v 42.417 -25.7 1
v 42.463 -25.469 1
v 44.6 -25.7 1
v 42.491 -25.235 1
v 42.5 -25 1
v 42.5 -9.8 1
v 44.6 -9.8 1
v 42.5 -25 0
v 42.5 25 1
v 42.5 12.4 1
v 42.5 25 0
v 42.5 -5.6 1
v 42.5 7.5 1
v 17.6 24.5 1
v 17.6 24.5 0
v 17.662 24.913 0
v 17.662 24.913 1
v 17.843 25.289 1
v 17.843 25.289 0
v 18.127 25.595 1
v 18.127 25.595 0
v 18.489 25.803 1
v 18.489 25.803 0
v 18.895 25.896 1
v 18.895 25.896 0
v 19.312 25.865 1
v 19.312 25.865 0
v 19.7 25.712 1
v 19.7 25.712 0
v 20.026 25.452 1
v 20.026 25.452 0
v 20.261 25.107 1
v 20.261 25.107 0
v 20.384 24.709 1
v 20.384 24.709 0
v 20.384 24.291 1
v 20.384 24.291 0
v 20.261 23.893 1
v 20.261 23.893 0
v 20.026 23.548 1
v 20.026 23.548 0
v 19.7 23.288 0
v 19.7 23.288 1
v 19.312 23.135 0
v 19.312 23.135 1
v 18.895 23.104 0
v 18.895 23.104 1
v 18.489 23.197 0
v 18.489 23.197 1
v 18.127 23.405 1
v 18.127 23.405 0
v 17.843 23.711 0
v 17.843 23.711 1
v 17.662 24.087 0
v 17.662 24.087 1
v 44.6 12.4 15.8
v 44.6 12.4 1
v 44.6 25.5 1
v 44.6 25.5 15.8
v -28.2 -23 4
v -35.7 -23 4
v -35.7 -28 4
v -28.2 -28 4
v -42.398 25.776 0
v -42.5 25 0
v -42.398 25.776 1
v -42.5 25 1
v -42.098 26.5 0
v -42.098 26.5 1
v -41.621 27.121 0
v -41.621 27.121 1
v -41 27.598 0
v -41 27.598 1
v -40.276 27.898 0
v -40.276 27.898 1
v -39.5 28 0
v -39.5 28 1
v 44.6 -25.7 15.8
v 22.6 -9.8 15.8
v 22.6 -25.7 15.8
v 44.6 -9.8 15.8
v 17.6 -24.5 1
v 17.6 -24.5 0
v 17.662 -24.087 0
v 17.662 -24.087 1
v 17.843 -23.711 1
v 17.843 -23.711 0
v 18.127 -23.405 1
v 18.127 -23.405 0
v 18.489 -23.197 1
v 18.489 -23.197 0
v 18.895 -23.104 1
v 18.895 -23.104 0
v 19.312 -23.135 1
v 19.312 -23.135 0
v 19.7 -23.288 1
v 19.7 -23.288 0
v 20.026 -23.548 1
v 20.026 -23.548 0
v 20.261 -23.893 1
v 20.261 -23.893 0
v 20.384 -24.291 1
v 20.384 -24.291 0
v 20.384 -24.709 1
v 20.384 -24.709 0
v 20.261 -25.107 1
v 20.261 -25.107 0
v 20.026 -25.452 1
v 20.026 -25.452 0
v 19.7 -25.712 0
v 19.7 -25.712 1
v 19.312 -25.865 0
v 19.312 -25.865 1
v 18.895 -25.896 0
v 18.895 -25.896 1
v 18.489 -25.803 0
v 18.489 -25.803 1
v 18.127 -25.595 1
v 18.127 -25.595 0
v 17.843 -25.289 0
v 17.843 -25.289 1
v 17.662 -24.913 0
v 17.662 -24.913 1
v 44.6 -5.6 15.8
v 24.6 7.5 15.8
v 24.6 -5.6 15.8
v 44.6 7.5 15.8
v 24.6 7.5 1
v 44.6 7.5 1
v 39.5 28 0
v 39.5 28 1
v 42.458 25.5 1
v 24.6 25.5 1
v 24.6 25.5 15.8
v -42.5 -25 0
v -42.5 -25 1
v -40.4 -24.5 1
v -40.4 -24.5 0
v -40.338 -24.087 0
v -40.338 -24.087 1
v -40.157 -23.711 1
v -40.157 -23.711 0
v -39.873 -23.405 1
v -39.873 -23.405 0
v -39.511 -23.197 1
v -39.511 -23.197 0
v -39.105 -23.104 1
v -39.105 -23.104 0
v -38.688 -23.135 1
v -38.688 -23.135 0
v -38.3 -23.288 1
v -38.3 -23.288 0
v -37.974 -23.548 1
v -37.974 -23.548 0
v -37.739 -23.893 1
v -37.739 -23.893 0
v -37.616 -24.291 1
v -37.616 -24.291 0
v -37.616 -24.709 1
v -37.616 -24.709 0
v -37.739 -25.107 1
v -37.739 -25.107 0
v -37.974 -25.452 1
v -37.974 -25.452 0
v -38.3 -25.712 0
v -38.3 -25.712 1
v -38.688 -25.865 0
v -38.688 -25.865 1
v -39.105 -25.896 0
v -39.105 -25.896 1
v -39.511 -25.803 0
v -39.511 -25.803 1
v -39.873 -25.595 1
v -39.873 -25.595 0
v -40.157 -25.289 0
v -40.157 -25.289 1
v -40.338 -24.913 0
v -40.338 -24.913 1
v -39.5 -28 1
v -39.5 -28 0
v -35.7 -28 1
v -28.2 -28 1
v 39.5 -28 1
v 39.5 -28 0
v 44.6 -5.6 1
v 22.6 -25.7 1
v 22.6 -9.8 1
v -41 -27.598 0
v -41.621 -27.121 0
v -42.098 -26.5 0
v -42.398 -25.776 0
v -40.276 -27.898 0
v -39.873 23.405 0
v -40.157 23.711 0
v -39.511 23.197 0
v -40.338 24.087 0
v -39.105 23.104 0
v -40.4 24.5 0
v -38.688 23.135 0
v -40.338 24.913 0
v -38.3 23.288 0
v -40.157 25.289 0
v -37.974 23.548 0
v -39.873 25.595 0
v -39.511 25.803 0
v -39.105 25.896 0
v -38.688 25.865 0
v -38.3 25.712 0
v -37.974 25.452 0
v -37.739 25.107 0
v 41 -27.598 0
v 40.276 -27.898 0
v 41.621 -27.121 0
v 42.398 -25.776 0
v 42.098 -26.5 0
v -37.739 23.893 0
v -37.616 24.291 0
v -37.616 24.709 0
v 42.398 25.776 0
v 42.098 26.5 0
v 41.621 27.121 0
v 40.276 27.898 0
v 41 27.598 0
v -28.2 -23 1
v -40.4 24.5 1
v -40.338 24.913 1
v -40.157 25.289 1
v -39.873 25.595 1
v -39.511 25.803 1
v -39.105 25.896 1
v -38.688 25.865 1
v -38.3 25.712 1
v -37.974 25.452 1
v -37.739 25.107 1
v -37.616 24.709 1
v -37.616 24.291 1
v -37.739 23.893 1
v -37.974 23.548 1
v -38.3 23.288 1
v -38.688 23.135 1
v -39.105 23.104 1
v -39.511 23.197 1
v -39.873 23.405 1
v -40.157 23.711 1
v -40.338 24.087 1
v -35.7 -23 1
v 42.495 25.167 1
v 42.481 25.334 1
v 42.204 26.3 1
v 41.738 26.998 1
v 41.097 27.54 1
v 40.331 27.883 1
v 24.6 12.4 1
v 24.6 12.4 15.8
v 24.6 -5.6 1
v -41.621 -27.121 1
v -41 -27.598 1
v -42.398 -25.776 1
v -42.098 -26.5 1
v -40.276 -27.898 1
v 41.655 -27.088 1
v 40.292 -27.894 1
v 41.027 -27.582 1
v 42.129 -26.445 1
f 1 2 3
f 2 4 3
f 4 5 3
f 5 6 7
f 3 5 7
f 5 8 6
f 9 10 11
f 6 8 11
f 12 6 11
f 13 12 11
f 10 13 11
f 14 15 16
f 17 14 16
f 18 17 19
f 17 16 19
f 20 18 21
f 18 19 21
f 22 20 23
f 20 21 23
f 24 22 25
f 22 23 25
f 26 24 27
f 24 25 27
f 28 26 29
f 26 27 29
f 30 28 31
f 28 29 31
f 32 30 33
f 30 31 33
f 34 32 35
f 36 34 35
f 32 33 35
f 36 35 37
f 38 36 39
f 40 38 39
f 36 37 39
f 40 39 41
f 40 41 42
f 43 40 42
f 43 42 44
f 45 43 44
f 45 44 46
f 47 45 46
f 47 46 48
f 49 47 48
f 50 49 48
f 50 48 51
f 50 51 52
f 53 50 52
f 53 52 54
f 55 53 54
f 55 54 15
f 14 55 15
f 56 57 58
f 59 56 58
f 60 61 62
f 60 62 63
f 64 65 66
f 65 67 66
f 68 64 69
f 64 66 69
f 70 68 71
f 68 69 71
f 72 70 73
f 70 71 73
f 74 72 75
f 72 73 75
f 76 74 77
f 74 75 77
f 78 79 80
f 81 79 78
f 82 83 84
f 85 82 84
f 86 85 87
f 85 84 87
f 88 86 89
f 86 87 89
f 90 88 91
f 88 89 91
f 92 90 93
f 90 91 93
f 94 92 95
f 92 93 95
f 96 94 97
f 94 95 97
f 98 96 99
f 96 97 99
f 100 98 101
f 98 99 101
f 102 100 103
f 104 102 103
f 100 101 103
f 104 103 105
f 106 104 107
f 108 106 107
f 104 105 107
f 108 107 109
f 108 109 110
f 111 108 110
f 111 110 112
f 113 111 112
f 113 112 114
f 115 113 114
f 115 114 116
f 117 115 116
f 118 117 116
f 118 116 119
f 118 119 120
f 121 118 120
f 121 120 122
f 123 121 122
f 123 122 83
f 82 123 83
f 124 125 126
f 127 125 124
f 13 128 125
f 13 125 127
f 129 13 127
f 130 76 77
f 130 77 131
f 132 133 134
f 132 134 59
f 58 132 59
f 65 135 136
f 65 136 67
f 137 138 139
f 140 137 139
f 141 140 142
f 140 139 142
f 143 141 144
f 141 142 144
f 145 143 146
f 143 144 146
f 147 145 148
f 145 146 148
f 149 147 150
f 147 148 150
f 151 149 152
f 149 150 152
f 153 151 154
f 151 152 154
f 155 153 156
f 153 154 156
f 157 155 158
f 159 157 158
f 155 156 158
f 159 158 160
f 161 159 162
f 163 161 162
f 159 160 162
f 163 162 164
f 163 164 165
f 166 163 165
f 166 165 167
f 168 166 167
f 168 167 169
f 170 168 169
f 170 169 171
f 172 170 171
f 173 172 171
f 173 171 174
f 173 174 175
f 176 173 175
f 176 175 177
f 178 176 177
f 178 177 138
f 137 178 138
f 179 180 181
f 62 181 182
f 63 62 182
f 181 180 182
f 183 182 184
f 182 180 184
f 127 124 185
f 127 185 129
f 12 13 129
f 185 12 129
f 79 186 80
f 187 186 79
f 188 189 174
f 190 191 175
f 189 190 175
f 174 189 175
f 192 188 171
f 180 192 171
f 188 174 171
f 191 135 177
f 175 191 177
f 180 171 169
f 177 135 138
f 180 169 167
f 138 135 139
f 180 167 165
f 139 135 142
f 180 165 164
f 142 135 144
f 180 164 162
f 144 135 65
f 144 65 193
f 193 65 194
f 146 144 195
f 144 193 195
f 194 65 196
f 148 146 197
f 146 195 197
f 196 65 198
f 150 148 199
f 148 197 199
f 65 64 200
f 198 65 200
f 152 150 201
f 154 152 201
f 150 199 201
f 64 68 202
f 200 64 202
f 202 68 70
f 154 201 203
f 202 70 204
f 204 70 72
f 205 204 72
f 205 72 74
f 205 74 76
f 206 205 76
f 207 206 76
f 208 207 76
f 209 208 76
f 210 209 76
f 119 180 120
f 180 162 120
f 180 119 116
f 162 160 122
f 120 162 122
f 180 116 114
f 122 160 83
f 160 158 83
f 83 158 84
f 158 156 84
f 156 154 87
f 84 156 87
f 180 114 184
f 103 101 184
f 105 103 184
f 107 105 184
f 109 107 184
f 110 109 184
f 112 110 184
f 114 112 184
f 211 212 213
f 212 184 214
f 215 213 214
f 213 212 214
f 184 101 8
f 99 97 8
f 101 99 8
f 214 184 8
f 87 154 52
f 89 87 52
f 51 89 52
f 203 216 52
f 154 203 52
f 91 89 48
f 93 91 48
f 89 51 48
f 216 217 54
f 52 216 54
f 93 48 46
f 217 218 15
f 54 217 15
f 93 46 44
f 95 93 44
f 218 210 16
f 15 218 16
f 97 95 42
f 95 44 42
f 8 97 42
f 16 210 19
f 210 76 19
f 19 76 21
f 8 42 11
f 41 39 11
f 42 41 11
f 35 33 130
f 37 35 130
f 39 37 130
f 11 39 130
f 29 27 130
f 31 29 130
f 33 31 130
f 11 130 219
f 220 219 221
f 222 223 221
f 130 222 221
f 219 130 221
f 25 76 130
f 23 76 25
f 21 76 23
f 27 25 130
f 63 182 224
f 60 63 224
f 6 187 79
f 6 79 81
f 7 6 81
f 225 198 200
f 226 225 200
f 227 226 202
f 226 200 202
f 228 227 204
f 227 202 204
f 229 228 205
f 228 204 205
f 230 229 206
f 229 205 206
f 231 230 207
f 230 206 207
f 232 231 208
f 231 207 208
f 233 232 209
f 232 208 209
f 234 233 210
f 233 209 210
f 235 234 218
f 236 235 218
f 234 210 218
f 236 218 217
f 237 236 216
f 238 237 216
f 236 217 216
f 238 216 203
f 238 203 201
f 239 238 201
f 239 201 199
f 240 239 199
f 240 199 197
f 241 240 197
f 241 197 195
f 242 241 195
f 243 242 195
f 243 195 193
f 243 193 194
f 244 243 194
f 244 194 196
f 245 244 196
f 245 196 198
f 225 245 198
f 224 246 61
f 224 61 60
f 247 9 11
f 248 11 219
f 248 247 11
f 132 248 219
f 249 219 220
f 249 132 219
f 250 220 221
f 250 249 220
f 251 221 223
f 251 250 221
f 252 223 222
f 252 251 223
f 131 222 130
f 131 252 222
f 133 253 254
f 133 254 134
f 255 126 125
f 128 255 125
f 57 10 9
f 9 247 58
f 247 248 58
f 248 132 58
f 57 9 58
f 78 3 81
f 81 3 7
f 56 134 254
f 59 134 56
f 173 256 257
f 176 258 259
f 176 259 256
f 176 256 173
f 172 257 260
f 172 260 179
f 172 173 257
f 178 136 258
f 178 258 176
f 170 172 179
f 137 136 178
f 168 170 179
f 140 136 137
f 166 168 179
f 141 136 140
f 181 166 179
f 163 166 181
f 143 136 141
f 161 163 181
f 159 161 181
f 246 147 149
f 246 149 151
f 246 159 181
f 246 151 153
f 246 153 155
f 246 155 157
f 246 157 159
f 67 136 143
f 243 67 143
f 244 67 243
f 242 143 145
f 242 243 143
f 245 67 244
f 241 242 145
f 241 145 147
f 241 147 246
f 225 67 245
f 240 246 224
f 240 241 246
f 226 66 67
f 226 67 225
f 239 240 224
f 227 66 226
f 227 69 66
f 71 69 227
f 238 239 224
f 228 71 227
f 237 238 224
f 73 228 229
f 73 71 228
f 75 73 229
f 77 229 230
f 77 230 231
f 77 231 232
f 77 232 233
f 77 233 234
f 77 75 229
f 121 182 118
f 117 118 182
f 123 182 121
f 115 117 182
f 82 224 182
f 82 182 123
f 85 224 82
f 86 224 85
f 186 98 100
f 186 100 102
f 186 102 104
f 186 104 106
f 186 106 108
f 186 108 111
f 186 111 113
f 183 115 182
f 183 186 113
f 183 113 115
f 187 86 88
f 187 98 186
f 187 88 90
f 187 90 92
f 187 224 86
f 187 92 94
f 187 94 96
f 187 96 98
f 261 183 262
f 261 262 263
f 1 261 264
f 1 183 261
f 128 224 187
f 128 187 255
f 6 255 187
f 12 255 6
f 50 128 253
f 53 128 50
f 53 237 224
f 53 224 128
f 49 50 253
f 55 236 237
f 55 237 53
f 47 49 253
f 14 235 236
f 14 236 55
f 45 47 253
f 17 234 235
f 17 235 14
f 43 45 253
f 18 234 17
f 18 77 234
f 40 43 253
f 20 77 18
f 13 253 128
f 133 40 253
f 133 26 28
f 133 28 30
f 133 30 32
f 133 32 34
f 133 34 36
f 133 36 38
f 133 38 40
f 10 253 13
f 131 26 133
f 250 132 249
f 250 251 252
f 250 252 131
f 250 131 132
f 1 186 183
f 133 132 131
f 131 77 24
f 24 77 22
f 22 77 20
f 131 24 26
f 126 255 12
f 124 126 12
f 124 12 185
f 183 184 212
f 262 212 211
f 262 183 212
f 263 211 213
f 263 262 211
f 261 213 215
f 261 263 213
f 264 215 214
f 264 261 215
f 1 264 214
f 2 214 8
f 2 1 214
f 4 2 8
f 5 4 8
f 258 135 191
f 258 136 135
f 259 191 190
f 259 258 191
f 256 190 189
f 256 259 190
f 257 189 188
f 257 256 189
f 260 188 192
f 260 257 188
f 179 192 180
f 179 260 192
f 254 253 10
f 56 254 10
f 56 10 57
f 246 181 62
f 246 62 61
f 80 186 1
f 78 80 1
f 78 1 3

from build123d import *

# Parameters (mm, degrees)
F0_W     = 85
F0_H     = 56
F1_DEPTH = 1
F2_R     = 3
F3_W     = 22
F3_H     = 15.9
F3_W_2   = 20
F3_H_2   = 13.1
F4_DEPTH = 14.8
F6_D     = 2.8
F6_DEPTH = 5
F7_W     = 7.5
F7_H     = 5
F8_DEPTH = 3


with BuildPart() as f1:
    # F0 (on Top) → F1 (new body)
    with BuildSketch(Plane.XY):
        Rectangle(F0_W, F0_H)
    extrude(amount=F1_DEPTH)

    # F2
    f2_edges = [f1.edges().sort_by_distance(p)[0] for p in [
        (42.5, -28, 0.5),
        (42.5, 28, 0.5),
        (-42.5, 28, 0.5),
        (-42.5, -28, 0.5),
    ]]
    fillet(f2_edges, radius=F2_R)

    # F3 (on face) → F4 (join)
    with BuildSketch(Plane.XY.offset(1)):
        with Locations((33.6, -17.75)):
            Rectangle(F3_W, F3_H)
        with Locations((34.6, 0.95)):
            Rectangle(F3_W_2, F3_H_2)
        with Locations((34.6, 18.95)):
            Rectangle(F3_W_2, F3_H_2)
    extrude(amount=F4_DEPTH)

    # F6
    with Locations(Plane.XY.offset(1)):
        with Locations((-39, 24.5), (19, 24.5), (19, -24.5), (-39, -24.5)):
            Hole(F6_D / 2, depth=F6_DEPTH)

    # F7 (on face) → F8 (join)
    with BuildSketch(Plane.XY.offset(1)):
        with Locations((-31.95, -25.5)):
            Rectangle(F7_W, F7_H)
    extrude(amount=F8_DEPTH)


solid = f1.part
